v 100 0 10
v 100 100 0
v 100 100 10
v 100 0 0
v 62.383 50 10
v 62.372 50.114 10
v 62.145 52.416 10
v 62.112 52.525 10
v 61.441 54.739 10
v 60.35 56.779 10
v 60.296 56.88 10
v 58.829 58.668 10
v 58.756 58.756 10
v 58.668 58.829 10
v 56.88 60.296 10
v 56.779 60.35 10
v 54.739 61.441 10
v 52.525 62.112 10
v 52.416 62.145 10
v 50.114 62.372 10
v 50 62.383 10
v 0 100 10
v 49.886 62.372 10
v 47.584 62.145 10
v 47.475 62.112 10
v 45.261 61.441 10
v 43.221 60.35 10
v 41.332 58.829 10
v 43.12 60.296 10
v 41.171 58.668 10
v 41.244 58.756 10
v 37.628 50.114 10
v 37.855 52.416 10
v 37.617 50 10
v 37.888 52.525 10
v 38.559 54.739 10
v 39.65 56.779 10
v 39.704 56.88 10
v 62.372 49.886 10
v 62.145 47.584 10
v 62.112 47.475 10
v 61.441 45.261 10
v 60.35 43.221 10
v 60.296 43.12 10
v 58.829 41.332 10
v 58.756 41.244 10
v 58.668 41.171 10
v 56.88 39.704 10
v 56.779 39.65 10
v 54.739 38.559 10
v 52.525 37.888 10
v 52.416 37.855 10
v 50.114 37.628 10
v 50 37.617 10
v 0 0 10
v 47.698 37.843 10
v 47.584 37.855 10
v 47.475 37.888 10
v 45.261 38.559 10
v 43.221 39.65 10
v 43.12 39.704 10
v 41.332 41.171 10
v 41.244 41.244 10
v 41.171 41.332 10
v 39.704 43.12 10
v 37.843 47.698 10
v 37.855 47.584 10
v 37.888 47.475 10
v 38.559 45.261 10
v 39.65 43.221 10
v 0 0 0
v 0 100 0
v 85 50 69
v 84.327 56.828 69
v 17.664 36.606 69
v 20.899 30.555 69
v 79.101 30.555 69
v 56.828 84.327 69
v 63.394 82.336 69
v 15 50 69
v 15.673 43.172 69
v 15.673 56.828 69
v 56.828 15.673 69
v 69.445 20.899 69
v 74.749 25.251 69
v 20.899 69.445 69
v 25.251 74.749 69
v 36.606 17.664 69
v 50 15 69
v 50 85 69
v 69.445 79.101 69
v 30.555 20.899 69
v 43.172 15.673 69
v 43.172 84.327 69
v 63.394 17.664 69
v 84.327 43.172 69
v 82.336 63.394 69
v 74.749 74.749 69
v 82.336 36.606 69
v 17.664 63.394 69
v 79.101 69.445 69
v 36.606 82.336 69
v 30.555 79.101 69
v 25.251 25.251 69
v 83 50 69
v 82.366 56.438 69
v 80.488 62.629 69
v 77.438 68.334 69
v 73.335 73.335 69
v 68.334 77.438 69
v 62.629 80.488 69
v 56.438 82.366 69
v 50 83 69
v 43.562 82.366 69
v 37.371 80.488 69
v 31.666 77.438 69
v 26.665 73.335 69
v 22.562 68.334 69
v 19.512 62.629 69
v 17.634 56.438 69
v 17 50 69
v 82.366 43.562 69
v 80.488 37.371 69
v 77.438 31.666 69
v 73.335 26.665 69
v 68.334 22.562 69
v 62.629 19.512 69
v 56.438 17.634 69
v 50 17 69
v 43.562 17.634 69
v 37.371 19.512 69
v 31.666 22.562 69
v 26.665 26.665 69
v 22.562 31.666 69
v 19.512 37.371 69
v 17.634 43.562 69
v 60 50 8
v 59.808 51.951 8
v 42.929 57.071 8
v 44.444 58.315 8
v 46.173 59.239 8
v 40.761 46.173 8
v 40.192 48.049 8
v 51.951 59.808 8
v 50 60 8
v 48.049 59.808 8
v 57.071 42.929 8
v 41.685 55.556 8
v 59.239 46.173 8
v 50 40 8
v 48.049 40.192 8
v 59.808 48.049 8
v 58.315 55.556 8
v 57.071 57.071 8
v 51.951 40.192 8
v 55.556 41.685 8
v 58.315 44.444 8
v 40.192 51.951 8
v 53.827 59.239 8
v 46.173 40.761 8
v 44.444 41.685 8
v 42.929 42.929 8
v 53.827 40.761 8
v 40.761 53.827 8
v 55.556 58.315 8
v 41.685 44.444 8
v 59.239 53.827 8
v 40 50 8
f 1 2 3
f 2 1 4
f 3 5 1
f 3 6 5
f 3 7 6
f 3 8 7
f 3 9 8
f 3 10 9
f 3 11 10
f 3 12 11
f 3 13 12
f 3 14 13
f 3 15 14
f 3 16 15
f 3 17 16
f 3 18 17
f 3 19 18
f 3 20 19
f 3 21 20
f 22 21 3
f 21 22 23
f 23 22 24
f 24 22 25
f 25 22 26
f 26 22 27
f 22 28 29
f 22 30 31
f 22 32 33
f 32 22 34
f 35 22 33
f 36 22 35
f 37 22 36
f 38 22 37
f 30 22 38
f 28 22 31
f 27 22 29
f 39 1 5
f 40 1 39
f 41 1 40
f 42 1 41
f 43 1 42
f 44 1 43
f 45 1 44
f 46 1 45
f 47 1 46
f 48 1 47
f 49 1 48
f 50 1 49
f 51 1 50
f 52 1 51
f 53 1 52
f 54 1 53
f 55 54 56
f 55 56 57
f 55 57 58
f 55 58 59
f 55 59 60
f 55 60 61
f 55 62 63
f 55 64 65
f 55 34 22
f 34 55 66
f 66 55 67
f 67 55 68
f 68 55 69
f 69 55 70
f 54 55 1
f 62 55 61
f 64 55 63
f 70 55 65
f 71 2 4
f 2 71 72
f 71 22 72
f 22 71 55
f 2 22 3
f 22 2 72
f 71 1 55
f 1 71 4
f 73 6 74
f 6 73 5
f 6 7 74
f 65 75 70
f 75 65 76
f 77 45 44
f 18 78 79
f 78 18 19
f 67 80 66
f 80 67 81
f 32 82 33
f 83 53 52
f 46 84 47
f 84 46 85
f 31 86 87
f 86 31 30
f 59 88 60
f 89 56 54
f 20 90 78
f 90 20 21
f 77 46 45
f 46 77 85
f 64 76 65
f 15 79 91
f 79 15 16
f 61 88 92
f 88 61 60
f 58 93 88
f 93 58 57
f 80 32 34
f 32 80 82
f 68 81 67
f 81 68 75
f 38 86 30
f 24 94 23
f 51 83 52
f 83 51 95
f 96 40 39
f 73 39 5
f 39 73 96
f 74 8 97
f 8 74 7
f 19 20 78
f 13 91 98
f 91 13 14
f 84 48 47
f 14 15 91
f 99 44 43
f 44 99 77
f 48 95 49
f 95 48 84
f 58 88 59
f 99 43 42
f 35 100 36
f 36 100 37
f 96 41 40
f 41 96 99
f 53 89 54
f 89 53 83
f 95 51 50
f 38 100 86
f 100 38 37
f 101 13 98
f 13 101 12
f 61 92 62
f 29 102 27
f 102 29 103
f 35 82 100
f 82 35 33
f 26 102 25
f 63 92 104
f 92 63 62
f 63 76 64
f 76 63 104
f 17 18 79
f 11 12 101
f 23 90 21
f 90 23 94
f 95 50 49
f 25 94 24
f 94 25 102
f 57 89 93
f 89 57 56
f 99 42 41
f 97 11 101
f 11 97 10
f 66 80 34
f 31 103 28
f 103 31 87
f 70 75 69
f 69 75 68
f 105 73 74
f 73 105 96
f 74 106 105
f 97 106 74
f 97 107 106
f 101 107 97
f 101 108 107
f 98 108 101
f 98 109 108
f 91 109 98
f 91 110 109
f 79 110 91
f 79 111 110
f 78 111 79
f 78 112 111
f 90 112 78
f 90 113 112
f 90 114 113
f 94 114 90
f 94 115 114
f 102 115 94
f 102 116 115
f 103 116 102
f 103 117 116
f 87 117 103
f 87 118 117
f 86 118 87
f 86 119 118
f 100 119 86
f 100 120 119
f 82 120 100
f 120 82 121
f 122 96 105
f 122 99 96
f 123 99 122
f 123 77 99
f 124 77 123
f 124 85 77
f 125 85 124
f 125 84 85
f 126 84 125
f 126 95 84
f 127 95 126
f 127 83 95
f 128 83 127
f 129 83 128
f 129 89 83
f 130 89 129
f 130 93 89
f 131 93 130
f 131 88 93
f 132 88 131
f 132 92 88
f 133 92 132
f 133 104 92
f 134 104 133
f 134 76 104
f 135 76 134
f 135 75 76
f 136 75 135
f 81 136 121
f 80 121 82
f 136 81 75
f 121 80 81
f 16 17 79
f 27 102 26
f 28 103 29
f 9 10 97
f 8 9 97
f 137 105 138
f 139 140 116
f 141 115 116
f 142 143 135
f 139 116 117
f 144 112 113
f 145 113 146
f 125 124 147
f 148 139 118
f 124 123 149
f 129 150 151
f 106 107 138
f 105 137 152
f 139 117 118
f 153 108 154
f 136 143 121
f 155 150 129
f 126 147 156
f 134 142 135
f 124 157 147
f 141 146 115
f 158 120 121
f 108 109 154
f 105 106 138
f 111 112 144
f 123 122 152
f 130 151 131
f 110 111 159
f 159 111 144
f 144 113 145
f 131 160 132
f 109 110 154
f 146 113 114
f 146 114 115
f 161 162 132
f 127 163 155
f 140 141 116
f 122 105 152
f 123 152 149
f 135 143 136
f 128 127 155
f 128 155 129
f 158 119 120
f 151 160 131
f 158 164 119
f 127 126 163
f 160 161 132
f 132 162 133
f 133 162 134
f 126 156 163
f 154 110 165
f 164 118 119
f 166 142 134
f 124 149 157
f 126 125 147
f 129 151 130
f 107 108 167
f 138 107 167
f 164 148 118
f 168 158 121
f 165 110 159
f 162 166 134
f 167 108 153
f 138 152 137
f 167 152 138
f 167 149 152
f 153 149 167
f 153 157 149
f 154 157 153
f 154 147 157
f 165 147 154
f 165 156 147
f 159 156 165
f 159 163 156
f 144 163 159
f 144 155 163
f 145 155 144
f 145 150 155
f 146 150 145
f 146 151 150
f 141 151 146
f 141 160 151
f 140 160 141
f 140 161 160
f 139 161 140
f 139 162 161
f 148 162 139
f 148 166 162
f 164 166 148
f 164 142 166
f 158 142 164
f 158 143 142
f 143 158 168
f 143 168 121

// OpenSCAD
$fn = 32;

// ----------------------------------------------------------------------
// Hopper: funnel with square flange
// ----------------------------------------------------------------------

// --- parameters (mm) ---
fl = 100;                 // flange side, X and Y
fl_t = 10;                // flange thickness
cone_h = 60;              // cone height above the flange
top_d = 70;               // cone mouth diameter
bot_d = 24;               // cone spout diameter
wall = 2;                 // cone wall thickness

bore_d = bot_d - 2 * wall;  // spout bore diameter
total_h = fl_t + cone_h - 1;  // overall height

difference() {
  union() {
    cube([fl, fl, fl_t]);
    translate([fl / 2, fl / 2, fl_t - 1])
      cylinder(h = cone_h, d1 = bot_d, d2 = top_d);
  }
  translate([fl / 2, fl / 2, fl_t - 2])
    cylinder(h = cone_h + 1, d1 = bore_d, d2 = top_d - 2 * wall);
}
